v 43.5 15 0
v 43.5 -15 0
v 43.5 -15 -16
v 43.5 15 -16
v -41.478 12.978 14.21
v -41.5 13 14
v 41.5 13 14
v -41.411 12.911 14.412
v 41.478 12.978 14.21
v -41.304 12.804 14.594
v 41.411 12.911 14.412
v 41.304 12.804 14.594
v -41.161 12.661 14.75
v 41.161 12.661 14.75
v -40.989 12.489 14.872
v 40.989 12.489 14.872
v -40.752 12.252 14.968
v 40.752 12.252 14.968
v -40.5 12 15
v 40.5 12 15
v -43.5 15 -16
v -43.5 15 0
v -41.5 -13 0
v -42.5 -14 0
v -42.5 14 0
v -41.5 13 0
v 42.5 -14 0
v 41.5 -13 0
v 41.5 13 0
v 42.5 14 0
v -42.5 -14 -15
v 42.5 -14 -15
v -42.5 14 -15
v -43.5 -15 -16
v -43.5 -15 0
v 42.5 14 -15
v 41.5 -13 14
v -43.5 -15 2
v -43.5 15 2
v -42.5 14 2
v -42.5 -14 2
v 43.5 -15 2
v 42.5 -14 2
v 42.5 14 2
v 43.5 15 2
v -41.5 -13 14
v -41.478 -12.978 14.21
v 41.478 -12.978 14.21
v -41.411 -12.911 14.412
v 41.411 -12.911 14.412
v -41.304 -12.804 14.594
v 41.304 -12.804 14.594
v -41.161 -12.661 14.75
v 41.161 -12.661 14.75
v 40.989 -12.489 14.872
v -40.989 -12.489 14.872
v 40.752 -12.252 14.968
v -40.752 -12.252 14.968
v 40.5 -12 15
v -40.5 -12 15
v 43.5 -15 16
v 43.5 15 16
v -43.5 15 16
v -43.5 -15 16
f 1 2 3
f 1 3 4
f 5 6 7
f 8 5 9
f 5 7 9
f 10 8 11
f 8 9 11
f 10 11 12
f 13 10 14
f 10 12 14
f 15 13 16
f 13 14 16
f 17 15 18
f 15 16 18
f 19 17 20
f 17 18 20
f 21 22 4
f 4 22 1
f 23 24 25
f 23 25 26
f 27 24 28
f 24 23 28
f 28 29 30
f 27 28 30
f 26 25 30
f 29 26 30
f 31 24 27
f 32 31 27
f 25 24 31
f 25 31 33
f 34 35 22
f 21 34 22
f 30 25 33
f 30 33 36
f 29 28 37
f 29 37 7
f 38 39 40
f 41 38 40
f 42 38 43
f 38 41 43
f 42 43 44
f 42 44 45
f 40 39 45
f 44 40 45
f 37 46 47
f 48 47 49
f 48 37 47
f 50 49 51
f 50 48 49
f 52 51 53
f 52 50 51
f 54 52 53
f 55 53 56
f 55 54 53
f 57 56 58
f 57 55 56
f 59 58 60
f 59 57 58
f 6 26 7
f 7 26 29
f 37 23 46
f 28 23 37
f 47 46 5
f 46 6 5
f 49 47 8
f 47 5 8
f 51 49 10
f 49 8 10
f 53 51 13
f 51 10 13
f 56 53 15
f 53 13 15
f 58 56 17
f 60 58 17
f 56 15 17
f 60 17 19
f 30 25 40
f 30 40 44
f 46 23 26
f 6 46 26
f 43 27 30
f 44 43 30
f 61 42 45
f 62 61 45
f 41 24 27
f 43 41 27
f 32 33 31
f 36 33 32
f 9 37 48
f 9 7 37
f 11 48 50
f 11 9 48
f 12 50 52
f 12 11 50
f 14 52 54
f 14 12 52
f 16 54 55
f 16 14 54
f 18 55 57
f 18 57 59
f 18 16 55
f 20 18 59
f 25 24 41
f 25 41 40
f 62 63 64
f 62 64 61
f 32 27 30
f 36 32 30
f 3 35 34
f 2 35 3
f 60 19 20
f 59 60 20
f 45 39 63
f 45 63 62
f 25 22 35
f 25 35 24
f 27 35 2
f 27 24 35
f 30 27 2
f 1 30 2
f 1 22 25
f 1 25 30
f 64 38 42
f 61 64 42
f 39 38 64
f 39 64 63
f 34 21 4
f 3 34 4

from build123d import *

# Parameters (mm, degrees)
SKETCH_W        = 87
SKETCH_H        = 30
PAD_DEPTH       = 16
SKETCH001_W     = 83
SKETCH001_H     = 26
POCKET_DEPTH    = 15
SKETCH002_W     = 87
SKETCH002_H     = 30
SKETCH002_W_2   = 85
SKETCH002_H_2   = 28
POCKET001_DEPTH = 2
FILLET_R        = 1
SKETCH003_W     = 87
SKETCH003_H     = 30
PAD001_DEPTH    = 16
SKETCH004_W     = 85
SKETCH004_H     = 28
POCKET002_DEPTH = 15


with BuildPart() as tilesleeve:
    # Sketch → Pad (new body)
    with BuildSketch(Plane.XY):
        Rectangle(SKETCH_W, SKETCH_H)
    extrude(amount=PAD_DEPTH)

    # Sketch001 → Pocket (cut)
    with BuildSketch(Plane.XY):
        Rectangle(SKETCH001_W, SKETCH001_H)
    extrude(amount=POCKET_DEPTH, mode=Mode.SUBTRACT)

    # Sketch002 → Pocket001 (cut)
    with BuildSketch(Plane.XY):
        Rectangle(SKETCH002_W, SKETCH002_H)
        Rectangle(SKETCH002_W_2, SKETCH002_H_2, mode=Mode.SUBTRACT)
    extrude(amount=POCKET001_DEPTH, mode=Mode.SUBTRACT)

    # Fillet
    fillet_edges = [tilesleeve.edges().sort_by_distance(p)[0] for p in [
        (0, 13, 15),
        (41.5, 0, 15),
        (0, -13, 15),
        (-41.5, 0, 15),
    ]]
    fillet(fillet_edges, radius=FILLET_R)


with BuildPart() as tilelid:
    # Sketch003 → Pad001 (new body)
    with BuildSketch(Plane.XY):
        Rectangle(SKETCH003_W, SKETCH003_H)
    extrude(amount=-PAD001_DEPTH)

    # Sketch004 → Pocket002 (cut)
    with BuildSketch(Plane.XY):
        Rectangle(SKETCH004_W, SKETCH004_H)
    extrude(amount=-POCKET002_DEPTH, mode=Mode.SUBTRACT)


solid = Compound([tilesleeve.part, tilelid.part])
